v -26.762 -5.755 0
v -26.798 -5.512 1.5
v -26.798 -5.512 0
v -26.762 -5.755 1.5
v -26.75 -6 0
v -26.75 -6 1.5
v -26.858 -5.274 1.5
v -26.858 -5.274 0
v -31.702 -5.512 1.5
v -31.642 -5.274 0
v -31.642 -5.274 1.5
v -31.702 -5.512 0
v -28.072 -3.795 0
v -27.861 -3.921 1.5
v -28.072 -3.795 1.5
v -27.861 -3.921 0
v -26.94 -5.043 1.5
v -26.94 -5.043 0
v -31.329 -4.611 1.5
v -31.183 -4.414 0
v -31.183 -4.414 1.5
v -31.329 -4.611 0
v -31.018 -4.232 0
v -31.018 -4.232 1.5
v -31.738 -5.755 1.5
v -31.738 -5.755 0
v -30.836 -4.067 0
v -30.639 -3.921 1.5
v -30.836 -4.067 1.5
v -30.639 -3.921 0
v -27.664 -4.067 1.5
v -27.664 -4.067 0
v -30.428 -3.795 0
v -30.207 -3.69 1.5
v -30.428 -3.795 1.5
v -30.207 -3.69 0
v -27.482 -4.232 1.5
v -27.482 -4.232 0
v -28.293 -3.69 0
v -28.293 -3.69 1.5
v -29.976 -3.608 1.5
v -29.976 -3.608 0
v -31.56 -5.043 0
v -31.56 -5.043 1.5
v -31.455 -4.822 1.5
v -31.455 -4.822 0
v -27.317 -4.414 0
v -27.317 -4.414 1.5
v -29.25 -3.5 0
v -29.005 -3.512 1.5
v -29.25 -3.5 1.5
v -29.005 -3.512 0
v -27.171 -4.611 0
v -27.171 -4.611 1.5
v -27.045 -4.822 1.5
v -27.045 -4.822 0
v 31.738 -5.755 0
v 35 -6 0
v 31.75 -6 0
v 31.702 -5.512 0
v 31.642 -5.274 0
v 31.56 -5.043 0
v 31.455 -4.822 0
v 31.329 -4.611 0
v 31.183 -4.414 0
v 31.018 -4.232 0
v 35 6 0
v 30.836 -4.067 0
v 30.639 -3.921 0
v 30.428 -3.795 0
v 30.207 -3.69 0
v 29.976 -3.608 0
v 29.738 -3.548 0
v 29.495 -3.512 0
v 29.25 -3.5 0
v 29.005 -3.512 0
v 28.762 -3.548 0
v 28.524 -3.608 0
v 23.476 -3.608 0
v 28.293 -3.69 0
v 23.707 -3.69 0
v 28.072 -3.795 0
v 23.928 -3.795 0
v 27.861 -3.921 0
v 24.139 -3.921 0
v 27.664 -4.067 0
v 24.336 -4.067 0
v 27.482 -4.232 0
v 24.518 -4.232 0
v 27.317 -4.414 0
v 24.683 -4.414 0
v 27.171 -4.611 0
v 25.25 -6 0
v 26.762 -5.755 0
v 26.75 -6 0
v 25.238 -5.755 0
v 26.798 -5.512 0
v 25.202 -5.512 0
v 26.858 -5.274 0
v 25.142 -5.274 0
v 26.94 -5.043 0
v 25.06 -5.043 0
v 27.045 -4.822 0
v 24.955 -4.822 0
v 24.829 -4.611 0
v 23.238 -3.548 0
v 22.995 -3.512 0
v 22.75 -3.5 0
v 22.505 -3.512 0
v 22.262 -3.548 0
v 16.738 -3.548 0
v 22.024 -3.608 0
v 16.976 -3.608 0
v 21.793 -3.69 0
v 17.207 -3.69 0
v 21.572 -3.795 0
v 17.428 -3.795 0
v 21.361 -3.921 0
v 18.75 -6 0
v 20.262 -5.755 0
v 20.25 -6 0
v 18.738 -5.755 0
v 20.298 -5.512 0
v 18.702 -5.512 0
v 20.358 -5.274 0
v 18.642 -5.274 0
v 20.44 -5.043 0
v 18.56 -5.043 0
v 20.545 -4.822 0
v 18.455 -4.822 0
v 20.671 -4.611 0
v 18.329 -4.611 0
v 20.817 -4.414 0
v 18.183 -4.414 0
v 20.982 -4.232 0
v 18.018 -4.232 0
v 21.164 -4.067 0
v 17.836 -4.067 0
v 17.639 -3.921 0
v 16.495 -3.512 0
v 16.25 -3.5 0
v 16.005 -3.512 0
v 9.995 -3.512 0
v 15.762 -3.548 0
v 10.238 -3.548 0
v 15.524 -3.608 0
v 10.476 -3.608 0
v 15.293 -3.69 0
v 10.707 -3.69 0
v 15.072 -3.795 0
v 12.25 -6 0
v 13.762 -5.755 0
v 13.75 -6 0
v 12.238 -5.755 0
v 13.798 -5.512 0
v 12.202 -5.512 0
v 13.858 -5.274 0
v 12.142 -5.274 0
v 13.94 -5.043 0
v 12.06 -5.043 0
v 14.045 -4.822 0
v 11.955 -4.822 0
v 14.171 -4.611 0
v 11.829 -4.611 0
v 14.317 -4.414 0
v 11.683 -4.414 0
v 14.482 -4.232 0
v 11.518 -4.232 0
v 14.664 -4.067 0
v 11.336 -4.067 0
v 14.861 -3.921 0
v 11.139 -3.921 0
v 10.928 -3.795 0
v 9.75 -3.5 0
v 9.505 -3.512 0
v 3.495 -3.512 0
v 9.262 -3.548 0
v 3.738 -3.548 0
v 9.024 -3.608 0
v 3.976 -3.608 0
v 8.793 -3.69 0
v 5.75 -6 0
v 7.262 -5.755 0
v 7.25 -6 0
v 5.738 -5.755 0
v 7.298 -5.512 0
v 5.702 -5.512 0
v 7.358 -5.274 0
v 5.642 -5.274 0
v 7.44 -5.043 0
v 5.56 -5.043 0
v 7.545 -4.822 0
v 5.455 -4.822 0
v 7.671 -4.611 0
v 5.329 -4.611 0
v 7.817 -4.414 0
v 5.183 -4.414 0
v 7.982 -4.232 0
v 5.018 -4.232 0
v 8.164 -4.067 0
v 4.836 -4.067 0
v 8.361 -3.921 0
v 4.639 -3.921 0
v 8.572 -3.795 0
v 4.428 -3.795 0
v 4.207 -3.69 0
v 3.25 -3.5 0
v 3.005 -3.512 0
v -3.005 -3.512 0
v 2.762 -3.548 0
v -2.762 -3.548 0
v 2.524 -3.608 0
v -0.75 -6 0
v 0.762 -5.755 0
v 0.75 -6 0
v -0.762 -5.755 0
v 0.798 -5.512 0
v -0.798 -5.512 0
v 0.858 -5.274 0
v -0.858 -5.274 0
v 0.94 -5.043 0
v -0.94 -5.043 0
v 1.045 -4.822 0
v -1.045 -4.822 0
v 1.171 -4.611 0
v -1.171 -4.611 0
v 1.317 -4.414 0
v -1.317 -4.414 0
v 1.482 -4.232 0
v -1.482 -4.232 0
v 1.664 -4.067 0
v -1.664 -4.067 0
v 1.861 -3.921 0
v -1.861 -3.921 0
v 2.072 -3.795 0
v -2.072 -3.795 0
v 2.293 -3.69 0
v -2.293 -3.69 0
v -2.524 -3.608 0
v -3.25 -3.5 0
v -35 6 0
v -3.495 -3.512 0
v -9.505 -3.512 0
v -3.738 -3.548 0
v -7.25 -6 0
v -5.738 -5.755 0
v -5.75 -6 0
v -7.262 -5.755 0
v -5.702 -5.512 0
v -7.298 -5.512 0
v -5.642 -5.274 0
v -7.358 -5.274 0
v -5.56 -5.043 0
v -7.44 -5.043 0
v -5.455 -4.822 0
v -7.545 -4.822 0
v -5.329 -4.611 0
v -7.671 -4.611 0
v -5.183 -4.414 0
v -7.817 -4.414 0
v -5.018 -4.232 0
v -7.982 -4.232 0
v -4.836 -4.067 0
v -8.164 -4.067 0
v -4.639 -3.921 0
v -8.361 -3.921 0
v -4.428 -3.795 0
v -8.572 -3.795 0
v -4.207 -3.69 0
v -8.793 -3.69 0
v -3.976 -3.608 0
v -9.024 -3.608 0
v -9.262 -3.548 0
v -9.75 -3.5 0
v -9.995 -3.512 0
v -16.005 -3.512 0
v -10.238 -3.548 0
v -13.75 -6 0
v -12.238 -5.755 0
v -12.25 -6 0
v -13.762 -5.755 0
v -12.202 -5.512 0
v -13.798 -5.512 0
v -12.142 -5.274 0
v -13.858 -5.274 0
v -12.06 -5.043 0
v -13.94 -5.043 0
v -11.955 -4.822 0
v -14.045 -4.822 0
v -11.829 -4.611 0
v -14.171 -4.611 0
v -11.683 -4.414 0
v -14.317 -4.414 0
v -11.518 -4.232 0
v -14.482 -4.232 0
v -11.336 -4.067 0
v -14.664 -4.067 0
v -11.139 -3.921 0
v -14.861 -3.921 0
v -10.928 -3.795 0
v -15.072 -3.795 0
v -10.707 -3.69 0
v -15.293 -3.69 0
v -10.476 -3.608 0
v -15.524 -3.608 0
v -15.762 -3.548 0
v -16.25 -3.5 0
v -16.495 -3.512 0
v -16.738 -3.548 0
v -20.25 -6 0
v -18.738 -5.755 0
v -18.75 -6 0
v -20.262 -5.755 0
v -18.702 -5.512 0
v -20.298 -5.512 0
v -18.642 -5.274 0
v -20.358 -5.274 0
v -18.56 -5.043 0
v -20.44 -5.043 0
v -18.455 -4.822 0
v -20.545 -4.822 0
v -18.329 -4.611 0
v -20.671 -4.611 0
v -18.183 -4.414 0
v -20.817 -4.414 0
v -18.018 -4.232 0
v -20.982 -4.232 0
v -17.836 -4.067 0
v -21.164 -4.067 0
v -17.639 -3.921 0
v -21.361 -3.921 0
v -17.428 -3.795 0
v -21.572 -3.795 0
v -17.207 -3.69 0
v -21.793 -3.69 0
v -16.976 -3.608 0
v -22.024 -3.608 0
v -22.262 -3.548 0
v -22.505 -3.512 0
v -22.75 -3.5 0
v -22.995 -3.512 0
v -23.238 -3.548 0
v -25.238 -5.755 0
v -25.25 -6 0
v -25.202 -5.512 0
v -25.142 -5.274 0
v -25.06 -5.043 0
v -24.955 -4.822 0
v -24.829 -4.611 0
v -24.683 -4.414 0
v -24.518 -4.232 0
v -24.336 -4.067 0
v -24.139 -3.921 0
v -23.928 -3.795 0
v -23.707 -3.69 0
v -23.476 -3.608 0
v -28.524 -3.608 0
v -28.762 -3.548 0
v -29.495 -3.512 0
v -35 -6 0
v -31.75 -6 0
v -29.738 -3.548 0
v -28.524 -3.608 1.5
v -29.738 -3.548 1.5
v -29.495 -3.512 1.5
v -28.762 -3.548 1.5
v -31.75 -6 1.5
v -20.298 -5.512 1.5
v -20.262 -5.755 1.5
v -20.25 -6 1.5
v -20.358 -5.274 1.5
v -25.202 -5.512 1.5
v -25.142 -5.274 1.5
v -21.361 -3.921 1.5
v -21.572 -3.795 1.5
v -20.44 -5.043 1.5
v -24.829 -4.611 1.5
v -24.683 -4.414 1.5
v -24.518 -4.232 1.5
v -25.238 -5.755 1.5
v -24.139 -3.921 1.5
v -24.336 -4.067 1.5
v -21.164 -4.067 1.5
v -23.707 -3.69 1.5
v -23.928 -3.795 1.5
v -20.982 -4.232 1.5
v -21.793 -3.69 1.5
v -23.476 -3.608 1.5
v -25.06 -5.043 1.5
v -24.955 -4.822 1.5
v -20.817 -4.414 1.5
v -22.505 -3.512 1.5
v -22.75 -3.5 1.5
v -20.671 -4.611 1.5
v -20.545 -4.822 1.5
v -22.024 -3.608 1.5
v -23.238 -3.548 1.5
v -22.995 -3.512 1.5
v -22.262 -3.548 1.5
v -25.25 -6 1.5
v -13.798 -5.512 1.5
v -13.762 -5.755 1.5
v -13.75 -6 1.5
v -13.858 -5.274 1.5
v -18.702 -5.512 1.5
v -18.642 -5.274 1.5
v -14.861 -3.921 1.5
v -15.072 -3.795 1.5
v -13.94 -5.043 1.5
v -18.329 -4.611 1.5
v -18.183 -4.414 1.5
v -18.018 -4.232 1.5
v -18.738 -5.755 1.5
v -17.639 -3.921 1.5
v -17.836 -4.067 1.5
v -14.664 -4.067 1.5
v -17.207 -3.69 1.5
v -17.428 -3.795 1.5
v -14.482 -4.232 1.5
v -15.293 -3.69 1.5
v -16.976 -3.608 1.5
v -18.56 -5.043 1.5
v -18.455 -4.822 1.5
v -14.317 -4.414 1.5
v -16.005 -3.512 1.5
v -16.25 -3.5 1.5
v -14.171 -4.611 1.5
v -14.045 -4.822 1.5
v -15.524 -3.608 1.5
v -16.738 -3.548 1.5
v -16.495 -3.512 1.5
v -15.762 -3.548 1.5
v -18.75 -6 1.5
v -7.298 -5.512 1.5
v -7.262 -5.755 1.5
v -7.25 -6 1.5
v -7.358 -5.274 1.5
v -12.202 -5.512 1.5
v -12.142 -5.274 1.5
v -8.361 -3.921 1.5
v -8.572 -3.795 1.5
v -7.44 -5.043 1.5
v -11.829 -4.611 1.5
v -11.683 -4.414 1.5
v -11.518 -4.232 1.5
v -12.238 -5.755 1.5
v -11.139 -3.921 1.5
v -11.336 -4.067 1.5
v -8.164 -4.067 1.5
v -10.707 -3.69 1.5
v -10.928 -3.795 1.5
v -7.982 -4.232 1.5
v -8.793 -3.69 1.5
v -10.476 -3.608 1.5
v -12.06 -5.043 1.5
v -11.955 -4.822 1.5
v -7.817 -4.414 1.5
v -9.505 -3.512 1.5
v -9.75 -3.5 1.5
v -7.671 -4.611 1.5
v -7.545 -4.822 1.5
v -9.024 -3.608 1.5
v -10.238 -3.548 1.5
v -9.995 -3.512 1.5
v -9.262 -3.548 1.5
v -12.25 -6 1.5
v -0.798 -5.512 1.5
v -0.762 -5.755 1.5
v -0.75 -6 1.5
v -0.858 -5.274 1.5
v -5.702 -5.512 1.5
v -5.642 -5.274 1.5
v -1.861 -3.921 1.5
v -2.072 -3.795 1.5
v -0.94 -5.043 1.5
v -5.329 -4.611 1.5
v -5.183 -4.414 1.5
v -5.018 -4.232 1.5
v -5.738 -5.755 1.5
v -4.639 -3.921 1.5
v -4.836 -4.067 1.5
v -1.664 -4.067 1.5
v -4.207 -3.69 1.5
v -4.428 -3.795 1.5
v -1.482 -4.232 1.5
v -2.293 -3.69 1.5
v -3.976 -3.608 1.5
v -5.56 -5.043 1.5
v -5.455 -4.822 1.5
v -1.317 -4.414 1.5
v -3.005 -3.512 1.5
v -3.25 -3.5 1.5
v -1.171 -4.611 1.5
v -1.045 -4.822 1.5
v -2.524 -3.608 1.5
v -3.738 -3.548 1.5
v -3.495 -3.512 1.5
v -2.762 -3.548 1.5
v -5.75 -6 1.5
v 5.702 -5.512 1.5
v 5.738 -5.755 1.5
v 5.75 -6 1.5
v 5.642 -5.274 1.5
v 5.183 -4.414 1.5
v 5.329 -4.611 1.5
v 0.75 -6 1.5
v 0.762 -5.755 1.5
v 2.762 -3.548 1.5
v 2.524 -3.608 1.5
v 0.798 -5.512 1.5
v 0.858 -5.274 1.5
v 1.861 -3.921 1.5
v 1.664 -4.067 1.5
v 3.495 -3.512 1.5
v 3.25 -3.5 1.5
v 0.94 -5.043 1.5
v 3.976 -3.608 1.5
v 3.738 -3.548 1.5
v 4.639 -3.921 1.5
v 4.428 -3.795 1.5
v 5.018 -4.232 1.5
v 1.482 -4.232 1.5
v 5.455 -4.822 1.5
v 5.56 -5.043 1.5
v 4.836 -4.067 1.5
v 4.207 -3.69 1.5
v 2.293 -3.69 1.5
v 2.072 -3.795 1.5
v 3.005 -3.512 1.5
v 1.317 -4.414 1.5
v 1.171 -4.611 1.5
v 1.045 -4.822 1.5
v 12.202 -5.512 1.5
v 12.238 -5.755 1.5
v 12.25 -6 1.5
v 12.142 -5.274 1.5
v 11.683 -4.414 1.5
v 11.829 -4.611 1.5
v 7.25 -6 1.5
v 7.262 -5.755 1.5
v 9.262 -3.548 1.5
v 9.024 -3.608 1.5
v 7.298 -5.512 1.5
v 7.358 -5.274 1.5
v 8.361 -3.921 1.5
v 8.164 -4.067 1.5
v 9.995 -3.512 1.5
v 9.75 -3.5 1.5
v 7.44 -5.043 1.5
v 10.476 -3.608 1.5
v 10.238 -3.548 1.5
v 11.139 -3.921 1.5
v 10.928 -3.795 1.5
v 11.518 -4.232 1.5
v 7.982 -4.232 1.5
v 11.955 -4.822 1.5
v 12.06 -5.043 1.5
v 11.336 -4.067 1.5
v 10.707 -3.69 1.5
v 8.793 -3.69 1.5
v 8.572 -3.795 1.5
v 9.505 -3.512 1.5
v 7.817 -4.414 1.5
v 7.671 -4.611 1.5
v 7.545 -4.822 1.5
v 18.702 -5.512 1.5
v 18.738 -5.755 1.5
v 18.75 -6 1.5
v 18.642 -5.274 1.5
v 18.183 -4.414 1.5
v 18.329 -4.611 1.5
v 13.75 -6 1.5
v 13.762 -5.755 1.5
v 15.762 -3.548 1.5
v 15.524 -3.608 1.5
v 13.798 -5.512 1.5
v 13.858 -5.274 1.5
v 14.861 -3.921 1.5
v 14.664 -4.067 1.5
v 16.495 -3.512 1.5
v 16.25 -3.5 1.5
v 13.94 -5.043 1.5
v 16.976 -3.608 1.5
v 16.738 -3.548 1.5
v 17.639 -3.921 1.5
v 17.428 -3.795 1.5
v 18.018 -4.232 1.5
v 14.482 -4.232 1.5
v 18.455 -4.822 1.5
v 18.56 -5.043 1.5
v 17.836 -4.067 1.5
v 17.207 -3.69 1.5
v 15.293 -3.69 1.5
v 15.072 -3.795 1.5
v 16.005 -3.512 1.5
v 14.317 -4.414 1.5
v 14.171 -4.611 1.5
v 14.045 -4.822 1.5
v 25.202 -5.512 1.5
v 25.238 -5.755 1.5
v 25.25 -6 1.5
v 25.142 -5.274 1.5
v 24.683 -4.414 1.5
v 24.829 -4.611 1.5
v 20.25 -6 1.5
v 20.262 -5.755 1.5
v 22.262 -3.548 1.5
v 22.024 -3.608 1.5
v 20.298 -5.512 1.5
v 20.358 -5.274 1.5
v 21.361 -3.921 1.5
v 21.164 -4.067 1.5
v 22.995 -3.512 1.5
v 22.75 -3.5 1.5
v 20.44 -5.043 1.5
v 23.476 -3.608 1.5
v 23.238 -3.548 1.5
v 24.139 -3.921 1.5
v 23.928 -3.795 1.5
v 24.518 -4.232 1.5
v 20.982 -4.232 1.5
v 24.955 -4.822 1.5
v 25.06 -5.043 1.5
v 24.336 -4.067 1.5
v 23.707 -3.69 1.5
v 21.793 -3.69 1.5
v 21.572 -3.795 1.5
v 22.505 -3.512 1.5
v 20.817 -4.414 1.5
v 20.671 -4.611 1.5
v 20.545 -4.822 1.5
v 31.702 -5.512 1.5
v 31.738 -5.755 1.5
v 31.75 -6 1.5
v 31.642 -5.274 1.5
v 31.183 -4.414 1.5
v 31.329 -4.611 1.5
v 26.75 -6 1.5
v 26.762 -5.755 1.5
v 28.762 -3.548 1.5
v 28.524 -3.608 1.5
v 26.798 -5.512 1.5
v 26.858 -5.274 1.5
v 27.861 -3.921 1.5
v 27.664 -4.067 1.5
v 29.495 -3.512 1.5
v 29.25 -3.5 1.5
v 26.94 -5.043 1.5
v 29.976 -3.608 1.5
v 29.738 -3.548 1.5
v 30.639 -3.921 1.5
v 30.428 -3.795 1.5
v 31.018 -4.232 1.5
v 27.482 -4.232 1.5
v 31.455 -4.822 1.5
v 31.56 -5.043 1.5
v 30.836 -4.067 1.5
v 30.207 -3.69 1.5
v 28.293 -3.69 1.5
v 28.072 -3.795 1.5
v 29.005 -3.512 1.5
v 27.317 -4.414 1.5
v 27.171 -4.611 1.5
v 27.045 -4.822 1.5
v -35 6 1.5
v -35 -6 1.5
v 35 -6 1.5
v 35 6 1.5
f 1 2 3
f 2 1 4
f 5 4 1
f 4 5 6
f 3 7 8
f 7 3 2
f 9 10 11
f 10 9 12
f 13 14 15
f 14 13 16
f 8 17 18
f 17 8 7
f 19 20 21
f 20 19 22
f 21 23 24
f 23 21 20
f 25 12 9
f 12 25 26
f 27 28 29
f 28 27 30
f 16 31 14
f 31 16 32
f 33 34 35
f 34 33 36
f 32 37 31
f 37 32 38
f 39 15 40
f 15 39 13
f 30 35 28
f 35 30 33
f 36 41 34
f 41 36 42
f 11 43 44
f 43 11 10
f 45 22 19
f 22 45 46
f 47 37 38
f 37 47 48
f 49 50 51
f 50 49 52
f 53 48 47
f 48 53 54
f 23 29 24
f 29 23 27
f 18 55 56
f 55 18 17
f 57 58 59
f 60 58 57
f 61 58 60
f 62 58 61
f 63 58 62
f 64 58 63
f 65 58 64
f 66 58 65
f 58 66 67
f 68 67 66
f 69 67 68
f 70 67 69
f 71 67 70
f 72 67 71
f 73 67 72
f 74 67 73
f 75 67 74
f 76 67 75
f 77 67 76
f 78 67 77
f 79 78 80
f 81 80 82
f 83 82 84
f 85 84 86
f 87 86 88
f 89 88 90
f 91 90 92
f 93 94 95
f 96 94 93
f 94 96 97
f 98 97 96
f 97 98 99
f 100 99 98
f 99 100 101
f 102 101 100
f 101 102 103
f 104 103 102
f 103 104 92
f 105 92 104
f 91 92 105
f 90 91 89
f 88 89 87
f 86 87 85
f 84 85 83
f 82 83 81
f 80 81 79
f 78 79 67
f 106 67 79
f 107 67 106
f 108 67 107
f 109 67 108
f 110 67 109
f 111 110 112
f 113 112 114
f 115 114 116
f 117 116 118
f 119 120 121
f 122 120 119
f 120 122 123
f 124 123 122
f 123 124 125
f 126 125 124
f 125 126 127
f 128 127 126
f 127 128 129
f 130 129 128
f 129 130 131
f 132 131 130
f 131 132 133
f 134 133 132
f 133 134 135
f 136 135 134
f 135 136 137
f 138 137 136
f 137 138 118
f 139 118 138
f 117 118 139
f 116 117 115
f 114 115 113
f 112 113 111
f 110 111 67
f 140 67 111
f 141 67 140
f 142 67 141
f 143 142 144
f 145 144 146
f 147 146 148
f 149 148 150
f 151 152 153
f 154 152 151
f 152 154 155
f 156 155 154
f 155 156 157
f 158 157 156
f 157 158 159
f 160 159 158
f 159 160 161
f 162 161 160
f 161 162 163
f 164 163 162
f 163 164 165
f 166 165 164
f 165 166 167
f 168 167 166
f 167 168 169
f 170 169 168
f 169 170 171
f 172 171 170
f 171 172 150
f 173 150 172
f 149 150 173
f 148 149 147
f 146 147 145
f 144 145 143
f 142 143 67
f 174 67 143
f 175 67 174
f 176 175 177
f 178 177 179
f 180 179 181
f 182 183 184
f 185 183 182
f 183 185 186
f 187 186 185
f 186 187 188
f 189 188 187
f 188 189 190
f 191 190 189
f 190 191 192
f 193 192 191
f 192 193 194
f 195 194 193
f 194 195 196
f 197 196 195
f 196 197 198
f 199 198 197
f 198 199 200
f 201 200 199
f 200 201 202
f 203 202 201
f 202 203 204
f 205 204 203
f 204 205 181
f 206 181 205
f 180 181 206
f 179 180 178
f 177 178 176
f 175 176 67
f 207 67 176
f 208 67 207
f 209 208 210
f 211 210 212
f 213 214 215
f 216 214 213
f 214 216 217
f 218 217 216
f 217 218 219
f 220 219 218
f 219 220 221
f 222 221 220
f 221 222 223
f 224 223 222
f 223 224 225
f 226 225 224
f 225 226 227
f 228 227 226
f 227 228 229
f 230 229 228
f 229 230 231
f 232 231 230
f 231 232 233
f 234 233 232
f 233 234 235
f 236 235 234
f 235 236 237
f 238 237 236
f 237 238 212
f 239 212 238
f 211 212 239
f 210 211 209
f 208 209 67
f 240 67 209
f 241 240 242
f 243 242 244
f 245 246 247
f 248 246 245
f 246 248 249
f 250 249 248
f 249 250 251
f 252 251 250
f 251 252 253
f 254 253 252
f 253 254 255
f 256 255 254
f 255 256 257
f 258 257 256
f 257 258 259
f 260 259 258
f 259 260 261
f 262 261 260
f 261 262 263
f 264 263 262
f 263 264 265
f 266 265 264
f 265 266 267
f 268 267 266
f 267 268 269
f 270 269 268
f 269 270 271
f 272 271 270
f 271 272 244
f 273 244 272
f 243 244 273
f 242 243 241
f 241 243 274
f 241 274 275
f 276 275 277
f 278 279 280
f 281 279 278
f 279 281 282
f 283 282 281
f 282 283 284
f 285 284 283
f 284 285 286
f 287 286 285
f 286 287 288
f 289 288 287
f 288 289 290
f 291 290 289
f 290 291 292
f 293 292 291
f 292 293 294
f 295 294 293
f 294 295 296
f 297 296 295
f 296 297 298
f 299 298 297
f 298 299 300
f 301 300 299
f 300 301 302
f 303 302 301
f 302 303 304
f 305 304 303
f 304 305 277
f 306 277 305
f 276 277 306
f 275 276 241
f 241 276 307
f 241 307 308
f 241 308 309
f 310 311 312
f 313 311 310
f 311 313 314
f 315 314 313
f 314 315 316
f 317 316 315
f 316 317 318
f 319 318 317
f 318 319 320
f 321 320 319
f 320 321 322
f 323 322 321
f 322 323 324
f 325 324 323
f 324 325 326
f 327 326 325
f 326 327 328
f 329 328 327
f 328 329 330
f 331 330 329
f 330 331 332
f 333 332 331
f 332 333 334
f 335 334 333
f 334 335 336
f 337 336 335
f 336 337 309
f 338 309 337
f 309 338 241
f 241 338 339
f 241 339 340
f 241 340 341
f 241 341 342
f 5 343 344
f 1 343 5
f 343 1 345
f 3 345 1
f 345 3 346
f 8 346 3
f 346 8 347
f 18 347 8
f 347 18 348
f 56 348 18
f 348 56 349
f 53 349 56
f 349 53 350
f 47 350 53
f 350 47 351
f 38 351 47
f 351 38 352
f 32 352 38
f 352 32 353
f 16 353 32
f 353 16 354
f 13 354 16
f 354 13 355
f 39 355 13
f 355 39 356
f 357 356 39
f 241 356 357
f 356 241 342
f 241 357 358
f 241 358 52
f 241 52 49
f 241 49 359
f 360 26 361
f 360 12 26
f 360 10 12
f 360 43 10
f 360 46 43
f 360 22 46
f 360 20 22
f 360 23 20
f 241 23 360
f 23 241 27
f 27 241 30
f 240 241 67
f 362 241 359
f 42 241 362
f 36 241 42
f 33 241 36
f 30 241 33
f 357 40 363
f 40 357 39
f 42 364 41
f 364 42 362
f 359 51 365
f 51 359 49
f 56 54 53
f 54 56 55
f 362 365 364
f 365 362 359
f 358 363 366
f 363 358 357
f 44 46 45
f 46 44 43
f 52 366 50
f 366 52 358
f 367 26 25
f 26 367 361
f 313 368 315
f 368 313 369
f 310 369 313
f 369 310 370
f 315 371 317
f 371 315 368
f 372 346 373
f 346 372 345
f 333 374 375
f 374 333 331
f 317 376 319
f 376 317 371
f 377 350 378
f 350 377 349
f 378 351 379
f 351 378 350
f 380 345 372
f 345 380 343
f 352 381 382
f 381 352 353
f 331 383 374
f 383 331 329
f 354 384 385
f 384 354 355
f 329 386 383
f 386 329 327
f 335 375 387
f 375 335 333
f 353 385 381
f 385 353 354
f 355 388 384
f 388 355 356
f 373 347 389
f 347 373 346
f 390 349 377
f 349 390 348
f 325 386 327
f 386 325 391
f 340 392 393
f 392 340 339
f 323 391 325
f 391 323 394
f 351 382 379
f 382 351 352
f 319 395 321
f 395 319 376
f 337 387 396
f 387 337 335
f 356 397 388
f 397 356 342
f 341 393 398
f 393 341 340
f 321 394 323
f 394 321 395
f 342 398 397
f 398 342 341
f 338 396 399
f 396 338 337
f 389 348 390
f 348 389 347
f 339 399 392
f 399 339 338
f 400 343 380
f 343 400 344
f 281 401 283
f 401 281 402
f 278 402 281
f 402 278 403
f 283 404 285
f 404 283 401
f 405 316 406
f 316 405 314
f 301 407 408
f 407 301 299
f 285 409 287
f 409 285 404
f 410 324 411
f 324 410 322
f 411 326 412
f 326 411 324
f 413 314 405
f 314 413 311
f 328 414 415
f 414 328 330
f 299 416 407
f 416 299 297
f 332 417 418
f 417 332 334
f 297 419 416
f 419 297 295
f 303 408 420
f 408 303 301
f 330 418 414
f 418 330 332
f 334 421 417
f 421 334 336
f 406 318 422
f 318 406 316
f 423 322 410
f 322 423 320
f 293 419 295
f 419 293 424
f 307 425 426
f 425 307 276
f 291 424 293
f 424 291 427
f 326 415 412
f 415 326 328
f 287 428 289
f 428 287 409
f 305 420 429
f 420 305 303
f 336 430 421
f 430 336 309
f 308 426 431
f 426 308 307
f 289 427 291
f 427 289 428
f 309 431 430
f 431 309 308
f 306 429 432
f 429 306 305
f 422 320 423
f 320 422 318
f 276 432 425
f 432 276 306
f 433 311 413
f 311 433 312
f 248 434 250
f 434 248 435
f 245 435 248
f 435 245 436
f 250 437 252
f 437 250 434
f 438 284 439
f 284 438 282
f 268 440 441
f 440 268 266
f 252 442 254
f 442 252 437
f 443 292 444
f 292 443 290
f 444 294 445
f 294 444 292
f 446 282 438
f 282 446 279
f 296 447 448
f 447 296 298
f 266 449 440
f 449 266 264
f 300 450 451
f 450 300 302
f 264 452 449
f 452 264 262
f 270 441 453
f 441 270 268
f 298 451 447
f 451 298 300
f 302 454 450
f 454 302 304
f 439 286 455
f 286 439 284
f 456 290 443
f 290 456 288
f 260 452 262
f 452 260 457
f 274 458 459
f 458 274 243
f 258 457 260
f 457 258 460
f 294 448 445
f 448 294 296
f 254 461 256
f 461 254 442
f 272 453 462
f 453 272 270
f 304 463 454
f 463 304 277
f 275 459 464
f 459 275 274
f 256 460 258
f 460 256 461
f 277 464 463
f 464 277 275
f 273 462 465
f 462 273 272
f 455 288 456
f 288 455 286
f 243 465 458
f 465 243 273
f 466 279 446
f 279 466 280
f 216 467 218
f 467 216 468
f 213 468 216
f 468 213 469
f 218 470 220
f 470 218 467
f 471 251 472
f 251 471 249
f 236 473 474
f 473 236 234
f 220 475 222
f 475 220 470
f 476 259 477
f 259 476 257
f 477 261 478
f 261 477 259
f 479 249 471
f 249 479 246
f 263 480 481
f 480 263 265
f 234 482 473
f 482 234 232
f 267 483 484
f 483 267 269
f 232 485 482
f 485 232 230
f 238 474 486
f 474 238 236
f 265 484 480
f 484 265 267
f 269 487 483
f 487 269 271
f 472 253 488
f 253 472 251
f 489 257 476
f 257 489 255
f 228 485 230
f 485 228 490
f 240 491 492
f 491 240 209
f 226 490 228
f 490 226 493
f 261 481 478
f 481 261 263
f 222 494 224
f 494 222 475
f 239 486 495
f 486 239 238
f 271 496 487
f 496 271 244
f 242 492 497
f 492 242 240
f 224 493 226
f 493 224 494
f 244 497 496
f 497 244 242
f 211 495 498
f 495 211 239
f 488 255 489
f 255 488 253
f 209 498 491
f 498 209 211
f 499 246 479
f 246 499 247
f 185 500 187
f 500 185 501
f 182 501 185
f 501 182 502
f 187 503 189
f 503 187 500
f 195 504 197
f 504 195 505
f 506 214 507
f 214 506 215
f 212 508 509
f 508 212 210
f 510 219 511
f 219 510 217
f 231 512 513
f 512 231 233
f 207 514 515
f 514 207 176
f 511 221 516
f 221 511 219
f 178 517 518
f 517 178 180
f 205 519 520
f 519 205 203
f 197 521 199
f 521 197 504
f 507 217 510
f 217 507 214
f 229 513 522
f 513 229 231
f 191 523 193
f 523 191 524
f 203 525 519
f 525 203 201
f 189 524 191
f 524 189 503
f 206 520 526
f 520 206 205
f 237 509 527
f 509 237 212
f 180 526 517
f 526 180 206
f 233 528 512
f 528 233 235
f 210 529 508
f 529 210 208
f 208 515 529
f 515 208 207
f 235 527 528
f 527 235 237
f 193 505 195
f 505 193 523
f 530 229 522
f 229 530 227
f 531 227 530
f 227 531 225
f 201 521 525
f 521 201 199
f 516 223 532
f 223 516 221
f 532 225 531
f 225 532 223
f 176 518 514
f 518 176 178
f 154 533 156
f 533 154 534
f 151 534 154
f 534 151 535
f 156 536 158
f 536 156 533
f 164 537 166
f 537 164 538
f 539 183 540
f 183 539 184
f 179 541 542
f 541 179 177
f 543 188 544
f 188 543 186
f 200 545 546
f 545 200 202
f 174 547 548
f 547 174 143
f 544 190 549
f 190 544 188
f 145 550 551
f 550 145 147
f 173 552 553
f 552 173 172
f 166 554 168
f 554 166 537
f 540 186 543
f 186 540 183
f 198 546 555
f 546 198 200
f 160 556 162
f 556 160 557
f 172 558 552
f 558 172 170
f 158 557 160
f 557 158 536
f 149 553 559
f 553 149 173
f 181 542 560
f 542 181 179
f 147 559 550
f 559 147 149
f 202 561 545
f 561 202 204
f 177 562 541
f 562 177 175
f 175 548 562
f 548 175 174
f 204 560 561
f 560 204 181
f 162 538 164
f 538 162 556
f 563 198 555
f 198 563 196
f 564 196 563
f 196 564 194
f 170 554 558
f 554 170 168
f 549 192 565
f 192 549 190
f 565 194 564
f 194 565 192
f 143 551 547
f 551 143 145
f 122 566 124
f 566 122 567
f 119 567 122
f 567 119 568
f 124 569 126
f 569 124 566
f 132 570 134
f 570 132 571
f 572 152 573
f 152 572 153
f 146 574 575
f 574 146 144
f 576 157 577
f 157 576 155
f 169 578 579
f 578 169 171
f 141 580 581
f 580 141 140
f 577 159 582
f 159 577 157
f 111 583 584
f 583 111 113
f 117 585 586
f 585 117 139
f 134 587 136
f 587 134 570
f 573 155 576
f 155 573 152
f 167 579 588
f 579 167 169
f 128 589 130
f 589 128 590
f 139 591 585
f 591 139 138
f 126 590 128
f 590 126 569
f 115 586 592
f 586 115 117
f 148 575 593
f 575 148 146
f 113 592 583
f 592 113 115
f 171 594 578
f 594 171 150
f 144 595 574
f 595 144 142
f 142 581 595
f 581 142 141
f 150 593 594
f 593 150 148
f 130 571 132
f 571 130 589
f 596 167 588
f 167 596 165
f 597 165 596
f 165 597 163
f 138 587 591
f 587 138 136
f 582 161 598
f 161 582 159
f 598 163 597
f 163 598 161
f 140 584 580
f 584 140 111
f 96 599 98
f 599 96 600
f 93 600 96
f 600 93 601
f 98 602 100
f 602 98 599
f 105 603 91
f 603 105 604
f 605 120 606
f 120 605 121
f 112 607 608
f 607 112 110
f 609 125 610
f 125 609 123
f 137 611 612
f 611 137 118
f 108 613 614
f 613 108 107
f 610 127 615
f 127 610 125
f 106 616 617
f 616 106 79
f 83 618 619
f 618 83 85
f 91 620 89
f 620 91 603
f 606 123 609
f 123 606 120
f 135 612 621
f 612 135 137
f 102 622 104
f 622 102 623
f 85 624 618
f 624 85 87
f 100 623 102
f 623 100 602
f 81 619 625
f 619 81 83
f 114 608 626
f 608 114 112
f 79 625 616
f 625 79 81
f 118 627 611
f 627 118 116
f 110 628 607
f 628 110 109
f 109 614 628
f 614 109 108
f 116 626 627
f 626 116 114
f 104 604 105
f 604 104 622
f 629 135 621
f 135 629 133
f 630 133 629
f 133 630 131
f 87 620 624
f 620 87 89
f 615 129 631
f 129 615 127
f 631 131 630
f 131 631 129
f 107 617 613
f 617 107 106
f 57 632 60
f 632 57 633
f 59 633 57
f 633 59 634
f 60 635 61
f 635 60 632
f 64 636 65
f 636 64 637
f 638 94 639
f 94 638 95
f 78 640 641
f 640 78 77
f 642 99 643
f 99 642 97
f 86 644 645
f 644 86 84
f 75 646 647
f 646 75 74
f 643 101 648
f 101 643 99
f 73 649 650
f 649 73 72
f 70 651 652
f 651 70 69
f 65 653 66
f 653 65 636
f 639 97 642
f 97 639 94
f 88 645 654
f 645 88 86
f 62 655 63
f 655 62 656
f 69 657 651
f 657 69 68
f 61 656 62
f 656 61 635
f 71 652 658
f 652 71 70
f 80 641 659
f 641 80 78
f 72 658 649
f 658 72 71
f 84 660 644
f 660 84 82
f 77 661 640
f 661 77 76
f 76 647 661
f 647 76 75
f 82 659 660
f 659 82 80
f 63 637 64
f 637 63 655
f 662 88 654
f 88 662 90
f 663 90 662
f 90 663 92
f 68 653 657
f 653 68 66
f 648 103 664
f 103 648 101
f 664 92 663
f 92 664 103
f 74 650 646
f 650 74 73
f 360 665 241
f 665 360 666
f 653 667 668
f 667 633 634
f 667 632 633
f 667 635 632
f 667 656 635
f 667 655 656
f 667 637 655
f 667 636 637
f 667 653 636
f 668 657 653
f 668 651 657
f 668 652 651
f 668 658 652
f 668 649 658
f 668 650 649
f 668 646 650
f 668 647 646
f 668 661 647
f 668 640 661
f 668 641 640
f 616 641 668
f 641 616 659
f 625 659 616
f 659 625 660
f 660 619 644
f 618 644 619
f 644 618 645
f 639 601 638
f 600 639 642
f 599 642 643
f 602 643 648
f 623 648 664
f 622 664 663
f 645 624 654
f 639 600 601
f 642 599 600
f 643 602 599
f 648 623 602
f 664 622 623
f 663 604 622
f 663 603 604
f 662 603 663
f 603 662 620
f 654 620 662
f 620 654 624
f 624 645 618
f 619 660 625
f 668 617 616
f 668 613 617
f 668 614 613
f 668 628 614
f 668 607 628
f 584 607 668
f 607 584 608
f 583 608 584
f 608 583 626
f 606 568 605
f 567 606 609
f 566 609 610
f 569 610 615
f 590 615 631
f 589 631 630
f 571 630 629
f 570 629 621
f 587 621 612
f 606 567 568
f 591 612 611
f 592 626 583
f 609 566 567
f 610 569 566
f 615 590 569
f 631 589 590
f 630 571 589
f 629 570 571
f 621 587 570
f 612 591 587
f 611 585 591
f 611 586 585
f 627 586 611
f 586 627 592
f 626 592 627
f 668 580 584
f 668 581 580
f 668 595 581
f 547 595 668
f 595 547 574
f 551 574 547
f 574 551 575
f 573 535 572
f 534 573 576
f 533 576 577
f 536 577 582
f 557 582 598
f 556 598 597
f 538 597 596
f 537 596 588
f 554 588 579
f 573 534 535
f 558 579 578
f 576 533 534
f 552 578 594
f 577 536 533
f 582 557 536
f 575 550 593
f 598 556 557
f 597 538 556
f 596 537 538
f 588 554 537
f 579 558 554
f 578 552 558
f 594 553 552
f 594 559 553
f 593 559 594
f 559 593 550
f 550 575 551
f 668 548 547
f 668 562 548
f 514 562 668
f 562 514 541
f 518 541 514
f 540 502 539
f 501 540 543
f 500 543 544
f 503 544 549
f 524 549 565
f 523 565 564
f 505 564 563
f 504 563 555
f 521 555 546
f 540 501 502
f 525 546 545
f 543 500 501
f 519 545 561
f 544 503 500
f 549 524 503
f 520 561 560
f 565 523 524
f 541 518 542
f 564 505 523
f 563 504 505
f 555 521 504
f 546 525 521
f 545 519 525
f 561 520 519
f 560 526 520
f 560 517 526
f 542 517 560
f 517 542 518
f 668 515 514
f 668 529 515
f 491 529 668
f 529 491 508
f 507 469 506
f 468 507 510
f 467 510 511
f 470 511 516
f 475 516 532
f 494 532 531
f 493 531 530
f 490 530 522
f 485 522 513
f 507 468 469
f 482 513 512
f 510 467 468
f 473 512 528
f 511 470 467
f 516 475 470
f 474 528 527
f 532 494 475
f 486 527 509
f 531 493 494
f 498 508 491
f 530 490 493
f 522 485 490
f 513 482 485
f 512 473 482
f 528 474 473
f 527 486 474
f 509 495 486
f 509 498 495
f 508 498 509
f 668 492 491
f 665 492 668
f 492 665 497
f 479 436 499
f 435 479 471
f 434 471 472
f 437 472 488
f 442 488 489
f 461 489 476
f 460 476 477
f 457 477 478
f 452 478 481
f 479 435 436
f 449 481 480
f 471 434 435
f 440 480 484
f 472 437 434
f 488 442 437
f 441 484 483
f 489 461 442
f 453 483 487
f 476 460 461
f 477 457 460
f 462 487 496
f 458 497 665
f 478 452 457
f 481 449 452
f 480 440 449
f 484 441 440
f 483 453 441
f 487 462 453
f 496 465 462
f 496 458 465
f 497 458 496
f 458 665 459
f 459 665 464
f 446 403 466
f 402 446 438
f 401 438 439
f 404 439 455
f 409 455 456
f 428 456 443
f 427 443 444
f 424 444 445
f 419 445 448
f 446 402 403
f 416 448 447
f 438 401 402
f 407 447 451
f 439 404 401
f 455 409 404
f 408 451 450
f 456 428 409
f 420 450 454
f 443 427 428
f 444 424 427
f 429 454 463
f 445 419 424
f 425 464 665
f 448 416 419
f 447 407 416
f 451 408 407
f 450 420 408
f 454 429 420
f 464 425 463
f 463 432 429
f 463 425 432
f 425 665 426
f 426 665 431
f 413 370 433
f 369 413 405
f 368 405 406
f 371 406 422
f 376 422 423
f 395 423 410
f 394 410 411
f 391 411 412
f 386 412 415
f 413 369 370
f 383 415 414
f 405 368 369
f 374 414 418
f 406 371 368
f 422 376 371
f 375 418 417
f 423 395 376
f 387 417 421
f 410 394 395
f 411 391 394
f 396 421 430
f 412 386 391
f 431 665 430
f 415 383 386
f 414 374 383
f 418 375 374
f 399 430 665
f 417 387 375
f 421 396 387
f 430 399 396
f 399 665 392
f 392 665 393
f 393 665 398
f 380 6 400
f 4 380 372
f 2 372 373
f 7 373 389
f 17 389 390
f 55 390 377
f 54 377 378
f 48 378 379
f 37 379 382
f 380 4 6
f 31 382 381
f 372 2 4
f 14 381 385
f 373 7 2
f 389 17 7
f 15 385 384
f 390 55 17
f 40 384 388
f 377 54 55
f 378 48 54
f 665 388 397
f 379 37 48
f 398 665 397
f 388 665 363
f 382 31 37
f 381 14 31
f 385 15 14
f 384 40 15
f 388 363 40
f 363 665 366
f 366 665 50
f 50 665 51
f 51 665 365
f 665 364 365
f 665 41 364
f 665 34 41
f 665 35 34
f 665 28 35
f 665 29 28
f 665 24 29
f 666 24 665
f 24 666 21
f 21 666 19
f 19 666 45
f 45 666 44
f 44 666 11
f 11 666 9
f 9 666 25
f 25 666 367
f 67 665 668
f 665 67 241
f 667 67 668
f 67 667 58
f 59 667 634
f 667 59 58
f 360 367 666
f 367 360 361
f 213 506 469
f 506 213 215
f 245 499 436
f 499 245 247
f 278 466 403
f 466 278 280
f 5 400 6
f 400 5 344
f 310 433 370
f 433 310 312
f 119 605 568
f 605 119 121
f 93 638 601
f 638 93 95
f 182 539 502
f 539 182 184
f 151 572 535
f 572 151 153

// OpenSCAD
// 10-well agarose gel comb - flat plate with spine and hanging teeth.
// Orientation: Lying flat on XY plane, spine along X, teeth hanging in -Y.

// Dimensions
spine_len = 70;
spine_w   = 12;
plate_thk = 1.5;

tooth_w   = 5.0;
tooth_len = 12;
tooth_gap = 1.5;
n_teeth   = 10;

$fn = 64;

// Calculate total width of the tooth row
tooth_row_w = n_teeth * tooth_w + (n_teeth - 1) * tooth_gap;

// Generate X positions for the teeth, centred on 0
// Formula: (i - (n-1)/2) * (tooth_w + tooth_gap)
tooth_positions = [for (i = [0 : n_teeth - 1]) let(pos = (i - (n_teeth - 1) / 2) * (tooth_w + tooth_gap)) pos];

difference() {
    // 1. Create the main spine plate
    // Extrude the spine rectangle to the full thickness.
    // Spine is 70mm long (X) and 12mm wide (Y).
    translate([0, 0, 0])
    linear_extrude(height = plate_thk)
    square([spine_len, spine_w], center = true);

    // 2. Cut out the teeth
    // The teeth hang from the edge of the spine in the -Y direction.
    // Spine Y range: -6 to +6.
    // Teeth start at Y = -6 and extend to Y = -6 - 12 = -18.
    
    cut_y_start = -spine_w / 2; // Top edge of the spine (in -Y direction)
    cut_y_end   = cut_y_start - tooth_len; // Bottom of the teeth
    
    // We subtract cylinders (extruded rectangles) for each tooth.
    // The cut shape needs to extend slightly past the bottom of the teeth to ensure clean separation.
    cut_depth = tooth_len + 0.1;

    for (x = tooth_positions) {
        // Position the cylinder at the calculated X, starting at the spine edge (Y = -6)
        // The cylinder height is the cut_depth.
        translate([x, cut_y_start, 0])
        cylinder(h = cut_depth + 0.1, d = tooth_w);
    }
}
